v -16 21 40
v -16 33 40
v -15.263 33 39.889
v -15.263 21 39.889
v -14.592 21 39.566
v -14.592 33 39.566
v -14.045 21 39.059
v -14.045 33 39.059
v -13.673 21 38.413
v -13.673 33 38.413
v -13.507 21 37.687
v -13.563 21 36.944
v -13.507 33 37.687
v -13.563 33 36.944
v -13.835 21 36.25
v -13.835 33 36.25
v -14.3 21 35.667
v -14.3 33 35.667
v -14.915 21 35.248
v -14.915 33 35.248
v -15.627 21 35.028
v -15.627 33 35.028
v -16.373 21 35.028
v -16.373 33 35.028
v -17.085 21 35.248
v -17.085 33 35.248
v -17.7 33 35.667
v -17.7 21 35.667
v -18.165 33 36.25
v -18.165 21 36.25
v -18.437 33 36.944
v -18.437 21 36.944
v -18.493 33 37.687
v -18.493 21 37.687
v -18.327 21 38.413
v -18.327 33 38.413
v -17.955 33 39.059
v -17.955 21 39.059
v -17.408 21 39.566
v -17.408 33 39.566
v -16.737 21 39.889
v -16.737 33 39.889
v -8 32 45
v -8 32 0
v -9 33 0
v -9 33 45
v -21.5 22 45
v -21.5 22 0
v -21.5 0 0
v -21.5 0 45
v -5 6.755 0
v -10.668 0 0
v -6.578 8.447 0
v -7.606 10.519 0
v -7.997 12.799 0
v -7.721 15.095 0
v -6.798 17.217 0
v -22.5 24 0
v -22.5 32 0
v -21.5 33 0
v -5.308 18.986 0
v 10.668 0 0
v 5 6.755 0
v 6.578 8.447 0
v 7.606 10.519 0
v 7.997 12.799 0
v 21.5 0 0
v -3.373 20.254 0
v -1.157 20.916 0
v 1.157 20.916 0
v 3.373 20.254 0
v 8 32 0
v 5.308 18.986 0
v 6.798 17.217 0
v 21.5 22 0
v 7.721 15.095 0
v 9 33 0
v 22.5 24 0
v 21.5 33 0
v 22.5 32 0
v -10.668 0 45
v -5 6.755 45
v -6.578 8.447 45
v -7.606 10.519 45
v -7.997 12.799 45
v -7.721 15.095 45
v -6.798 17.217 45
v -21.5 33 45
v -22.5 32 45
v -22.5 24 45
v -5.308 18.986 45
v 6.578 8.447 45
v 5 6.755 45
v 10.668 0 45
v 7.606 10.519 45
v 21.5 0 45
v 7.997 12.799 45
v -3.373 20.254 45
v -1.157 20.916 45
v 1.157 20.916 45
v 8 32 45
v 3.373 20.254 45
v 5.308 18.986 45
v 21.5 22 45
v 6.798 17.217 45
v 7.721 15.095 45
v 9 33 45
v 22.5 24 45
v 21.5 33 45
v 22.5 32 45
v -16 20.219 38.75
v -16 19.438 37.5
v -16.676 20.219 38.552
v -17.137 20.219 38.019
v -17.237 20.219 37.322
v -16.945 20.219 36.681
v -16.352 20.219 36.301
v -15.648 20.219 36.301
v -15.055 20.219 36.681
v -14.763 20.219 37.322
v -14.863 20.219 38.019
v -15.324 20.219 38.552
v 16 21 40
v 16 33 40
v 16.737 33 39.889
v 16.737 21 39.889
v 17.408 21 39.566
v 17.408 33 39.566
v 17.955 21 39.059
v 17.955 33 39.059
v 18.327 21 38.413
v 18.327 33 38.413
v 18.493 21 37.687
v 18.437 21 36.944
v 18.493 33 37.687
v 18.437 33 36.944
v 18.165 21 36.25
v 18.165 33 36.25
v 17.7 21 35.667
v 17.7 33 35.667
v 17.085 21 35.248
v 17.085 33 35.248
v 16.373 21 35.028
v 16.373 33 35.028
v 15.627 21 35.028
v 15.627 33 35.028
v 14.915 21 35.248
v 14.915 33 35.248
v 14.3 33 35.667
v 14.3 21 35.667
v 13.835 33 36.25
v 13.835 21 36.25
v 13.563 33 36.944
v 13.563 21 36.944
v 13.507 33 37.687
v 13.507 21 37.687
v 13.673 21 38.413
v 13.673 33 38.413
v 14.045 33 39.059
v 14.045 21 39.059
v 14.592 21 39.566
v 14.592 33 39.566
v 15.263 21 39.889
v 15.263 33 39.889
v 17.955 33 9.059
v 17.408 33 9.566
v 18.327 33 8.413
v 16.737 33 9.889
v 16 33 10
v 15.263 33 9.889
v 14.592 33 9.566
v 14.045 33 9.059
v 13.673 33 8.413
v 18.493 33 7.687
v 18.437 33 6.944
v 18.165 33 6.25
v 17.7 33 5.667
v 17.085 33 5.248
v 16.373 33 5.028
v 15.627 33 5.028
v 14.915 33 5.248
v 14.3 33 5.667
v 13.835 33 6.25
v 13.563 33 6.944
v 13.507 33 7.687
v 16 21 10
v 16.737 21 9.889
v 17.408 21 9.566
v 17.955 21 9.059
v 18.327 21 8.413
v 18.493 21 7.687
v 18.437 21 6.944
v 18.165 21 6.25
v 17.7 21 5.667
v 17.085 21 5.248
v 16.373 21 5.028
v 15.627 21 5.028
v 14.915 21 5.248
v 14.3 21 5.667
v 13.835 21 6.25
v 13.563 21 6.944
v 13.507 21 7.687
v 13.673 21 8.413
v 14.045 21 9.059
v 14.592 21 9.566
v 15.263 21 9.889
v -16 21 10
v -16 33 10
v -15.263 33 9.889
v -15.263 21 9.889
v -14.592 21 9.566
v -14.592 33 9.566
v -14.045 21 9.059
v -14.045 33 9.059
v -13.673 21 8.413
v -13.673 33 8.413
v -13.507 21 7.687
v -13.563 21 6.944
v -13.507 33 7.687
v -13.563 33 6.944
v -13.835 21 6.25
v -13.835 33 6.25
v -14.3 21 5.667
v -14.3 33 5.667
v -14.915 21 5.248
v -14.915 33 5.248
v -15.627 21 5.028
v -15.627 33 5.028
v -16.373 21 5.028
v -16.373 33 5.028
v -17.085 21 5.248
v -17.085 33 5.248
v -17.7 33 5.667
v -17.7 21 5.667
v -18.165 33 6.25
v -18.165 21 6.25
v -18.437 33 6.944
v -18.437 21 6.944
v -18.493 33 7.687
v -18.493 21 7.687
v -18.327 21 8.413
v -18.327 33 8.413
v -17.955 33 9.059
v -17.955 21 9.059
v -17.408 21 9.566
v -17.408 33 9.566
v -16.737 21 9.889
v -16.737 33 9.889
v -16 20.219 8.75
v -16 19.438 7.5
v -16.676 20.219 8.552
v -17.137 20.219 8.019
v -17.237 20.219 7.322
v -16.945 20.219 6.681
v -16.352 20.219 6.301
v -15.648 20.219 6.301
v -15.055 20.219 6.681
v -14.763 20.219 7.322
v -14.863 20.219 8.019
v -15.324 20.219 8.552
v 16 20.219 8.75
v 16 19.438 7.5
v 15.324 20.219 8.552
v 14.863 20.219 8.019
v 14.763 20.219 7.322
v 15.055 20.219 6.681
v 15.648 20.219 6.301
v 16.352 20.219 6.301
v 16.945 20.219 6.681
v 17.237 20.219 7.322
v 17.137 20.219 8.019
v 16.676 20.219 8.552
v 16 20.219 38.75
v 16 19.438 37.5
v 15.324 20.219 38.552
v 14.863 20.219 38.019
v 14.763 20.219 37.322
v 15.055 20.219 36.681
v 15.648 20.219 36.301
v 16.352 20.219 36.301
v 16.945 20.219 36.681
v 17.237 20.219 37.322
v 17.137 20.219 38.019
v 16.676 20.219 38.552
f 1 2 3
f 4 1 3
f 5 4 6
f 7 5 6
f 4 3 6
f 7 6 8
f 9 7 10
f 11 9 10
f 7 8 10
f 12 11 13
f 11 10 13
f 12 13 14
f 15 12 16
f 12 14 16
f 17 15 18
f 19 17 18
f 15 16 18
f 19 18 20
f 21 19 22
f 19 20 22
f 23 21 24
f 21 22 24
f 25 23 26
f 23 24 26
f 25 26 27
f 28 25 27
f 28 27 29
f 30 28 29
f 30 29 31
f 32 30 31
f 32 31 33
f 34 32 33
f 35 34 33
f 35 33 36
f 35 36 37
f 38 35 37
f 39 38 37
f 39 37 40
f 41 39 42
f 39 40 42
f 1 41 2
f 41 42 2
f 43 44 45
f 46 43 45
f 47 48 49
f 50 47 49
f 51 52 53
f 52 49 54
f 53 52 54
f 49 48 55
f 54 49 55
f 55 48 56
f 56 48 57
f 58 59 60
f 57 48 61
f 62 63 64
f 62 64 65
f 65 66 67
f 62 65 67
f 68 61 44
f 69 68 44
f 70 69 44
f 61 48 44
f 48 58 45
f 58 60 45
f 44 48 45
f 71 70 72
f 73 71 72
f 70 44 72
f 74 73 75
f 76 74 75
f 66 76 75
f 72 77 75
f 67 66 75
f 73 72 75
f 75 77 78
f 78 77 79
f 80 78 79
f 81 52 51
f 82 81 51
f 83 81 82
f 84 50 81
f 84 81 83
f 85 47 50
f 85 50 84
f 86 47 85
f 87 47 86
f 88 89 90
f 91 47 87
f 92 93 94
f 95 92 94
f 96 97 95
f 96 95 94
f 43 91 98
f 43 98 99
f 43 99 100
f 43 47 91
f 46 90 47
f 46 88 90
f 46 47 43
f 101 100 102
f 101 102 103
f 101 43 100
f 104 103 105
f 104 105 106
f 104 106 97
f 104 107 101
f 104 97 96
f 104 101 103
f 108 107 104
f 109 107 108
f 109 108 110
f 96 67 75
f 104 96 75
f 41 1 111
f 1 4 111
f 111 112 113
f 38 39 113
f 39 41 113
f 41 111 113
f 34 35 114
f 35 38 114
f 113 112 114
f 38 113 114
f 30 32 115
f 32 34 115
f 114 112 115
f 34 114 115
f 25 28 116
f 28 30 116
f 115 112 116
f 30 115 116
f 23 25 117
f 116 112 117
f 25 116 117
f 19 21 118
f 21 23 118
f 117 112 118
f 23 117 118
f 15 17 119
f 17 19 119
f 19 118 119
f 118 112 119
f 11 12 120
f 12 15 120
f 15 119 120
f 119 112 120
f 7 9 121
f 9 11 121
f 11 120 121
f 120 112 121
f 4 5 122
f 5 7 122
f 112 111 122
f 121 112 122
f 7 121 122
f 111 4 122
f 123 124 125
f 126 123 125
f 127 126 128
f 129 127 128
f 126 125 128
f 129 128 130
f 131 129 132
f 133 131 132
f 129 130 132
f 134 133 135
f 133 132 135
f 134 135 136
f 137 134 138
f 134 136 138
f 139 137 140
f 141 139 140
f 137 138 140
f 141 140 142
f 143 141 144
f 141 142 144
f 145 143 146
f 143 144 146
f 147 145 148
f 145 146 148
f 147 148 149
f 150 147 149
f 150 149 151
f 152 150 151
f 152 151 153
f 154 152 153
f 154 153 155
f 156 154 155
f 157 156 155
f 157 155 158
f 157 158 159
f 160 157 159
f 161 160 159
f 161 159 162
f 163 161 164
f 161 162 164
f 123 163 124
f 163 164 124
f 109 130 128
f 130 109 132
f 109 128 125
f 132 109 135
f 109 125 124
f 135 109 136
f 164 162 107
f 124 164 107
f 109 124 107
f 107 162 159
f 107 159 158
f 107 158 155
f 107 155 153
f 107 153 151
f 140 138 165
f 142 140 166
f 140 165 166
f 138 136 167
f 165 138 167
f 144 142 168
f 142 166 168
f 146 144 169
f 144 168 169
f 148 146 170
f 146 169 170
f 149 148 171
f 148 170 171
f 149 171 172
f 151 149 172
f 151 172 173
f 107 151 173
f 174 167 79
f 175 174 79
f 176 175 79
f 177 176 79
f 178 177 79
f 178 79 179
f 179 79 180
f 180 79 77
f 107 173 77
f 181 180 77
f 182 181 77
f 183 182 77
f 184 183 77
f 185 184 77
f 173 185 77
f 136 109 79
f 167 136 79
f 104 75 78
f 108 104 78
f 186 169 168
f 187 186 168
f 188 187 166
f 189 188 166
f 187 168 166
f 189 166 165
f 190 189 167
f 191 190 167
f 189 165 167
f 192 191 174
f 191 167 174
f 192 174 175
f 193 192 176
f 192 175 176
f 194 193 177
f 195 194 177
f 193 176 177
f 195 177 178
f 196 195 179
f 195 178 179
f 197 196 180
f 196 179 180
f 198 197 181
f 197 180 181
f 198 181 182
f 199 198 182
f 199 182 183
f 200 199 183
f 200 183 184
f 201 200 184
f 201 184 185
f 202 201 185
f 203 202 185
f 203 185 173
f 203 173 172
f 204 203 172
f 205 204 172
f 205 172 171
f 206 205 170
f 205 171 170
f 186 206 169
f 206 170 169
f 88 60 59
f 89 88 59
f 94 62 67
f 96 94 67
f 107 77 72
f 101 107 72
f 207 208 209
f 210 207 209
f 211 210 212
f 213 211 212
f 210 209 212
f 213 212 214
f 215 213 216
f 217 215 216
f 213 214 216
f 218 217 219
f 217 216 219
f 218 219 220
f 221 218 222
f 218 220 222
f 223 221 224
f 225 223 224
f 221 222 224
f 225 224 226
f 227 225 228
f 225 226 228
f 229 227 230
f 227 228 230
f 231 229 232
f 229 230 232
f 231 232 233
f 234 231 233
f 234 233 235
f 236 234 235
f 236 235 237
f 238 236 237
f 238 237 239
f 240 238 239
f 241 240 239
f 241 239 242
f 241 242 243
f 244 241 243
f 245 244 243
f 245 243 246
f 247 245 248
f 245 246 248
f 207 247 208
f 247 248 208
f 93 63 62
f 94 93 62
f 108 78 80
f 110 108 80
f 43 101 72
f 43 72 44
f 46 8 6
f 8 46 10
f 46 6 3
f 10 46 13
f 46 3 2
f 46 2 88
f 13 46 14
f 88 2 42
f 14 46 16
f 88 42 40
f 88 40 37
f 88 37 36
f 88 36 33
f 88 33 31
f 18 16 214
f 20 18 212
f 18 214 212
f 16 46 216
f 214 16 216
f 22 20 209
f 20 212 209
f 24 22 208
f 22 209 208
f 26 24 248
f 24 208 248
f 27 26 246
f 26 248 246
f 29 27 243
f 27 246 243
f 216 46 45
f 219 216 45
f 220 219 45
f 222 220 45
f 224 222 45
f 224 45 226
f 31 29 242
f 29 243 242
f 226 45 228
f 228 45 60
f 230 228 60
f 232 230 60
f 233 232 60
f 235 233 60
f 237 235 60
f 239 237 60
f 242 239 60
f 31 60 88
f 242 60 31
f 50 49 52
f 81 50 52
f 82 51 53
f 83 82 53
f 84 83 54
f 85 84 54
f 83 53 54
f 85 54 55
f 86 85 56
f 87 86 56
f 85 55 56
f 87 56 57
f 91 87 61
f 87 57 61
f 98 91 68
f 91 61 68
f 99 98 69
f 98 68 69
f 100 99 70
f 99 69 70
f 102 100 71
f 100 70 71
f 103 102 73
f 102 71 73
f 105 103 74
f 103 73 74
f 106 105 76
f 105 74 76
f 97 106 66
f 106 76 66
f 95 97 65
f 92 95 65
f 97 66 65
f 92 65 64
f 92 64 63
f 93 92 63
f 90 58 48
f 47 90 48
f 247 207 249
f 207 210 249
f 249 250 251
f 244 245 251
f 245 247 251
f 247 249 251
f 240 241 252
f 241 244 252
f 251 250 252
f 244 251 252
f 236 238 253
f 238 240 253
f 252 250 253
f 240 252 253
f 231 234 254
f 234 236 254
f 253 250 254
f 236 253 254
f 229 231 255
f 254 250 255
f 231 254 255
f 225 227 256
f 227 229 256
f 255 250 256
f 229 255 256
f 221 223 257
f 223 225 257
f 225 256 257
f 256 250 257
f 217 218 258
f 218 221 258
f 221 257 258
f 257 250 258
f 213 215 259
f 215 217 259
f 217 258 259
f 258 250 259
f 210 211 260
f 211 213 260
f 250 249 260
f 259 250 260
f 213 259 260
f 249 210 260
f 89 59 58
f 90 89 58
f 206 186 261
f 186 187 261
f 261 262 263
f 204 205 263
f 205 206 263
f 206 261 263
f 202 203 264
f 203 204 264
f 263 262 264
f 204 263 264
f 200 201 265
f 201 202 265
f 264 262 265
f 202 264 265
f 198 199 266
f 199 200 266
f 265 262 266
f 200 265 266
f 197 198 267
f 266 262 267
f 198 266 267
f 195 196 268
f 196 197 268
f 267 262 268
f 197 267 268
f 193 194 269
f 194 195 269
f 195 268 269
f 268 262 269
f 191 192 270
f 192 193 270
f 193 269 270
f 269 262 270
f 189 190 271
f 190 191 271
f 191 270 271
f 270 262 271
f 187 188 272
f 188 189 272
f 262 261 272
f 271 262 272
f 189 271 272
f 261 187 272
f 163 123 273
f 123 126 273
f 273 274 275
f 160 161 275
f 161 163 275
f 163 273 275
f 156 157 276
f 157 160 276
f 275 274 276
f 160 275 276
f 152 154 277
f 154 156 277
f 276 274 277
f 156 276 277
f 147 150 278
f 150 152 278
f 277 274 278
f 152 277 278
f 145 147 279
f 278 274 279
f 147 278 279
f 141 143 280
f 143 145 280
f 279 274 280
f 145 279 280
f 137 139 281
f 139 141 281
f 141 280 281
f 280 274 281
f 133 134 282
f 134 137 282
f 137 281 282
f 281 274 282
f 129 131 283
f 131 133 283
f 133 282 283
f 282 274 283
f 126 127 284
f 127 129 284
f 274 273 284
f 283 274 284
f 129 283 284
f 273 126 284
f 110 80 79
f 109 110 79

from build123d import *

# Parameters (mm, degrees)
DODANIE_WYCI_GNI_CIE1_DEPTH = 45
SZKIC2_R                    = 2.5
WYTNIJ_WYCI_GNI_CIE1_DEPTH  = 12


with BuildPart() as part:
    # Szkic1 → Dodanie-wyciągnięcie1 (new body)
    with BuildSketch(Plane.XY):
        with BuildLine():
            Line((8, 32), (-8, 32))
            Line((-8, 32), (-9, 33))
            Line((-9, 33), (-21.5, 33))
            Line((-21.5, 33), (-22.5, 32))
            Line((-22.5, 32), (-22.5, 24))
            Line((-22.5, 24), (-21.5, 22))
            Line((-21.5, 22), (-21.5, 0))
            Line((-21.5, 0), (-10.668119688, 0))
            Line((-10.668119688, 0), (-5, 6.755002002))
            ThreePointArc((-5, 6.755002002), (0, 21), (5, 6.755002002))
            Line((5, 6.755002002), (10.668119688, 0))
            Line((10.668119688, 0), (21.5, 0))
            Line((21.5, 0), (21.5, 22))
            Line((21.5, 22), (22.5, 24))
            Line((22.5, 24), (22.5, 32))
            Line((22.5, 32), (21.5, 33))
            Line((21.5, 33), (9, 33))
            Line((9, 33), (8, 32))
        make_face()
    extrude(amount=DODANIE_WYCI_GNI_CIE1_DEPTH)

    # Szkic2 → Wytnij-wyciągnięcie1 (cut)
    with BuildSketch(Plane(origin=(0, 33, 0), x_dir=(1, 0, 0), z_dir=(0, 1, 0))):
        with Locations(Location((-16, -37.5, 0), (0, 0, 270))):
            Circle(SZKIC2_R)
        with Locations(Location((-16, -7.5, 0), (0, 0, 270))):
            Circle(SZKIC2_R)
        with Locations(Location((16, -7.5, 0), (0, 0, 270))):
            Circle(SZKIC2_R)
        with Locations(Location((16, -37.5, 0), (0, 0, 270))):
            Circle(SZKIC2_R)
    extrude(amount=-WYTNIJ_WYCI_GNI_CIE1_DEPTH, mode=Mode.SUBTRACT)

    # Wytnij-wyciągnięcie2 cone 1 section (through the dimple's axis) → Wytnij-wyciągnięcie2 (revolve, cut)
    with BuildSketch(Plane(origin=(16, 21, 7.5), x_dir=(0, 0, 1), z_dir=(1, 0, 0))):
        Polygon((0, 0), (2.5, 0), (0, 1.56217338), align=None)
    revolve(axis=Axis((16, 21, 7.5), (0, -1, 0)), mode=Mode.SUBTRACT)

    # Wytnij-wyciągnięcie2 cone 2 section (through the dimple's axis) → Wytnij-wyciągnięcie2 cone 2 (revolve, cut)
    with BuildSketch(Plane(origin=(-16, 21, 7.5), x_dir=(0, 0, 1), z_dir=(1, 0, 0))):
        Polygon((0, 0), (2.5, 0), (0, 1.56217338), align=None)
    revolve(axis=Axis((-16, 21, 7.5), (0, -1, 0)), mode=Mode.SUBTRACT)

    # Wytnij-wyciągnięcie2 cone 3 section (through the dimple's axis) → Wytnij-wyciągnięcie2 cone 3 (revolve, cut)
    with BuildSketch(Plane(origin=(-16, 21, 37.5), x_dir=(0, 0, 1), z_dir=(1, 0, 0))):
        Polygon((0, 0), (2.5, 0), (0, 1.56217338), align=None)
    revolve(axis=Axis((-16, 21, 37.5), (0, -1, 0)), mode=Mode.SUBTRACT)

    # Wytnij-wyciągnięcie2 cone 4 section (through the dimple's axis) → Wytnij-wyciągnięcie2 cone 4 (revolve, cut)
    with BuildSketch(Plane(origin=(16, 21, 37.5), x_dir=(0, 0, 1), z_dir=(1, 0, 0))):
        Polygon((0, 0), (2.5, 0), (0, 1.56217338), align=None)
    revolve(axis=Axis((16, 21, 37.5), (0, -1, 0)), mode=Mode.SUBTRACT)


solid = part.part
